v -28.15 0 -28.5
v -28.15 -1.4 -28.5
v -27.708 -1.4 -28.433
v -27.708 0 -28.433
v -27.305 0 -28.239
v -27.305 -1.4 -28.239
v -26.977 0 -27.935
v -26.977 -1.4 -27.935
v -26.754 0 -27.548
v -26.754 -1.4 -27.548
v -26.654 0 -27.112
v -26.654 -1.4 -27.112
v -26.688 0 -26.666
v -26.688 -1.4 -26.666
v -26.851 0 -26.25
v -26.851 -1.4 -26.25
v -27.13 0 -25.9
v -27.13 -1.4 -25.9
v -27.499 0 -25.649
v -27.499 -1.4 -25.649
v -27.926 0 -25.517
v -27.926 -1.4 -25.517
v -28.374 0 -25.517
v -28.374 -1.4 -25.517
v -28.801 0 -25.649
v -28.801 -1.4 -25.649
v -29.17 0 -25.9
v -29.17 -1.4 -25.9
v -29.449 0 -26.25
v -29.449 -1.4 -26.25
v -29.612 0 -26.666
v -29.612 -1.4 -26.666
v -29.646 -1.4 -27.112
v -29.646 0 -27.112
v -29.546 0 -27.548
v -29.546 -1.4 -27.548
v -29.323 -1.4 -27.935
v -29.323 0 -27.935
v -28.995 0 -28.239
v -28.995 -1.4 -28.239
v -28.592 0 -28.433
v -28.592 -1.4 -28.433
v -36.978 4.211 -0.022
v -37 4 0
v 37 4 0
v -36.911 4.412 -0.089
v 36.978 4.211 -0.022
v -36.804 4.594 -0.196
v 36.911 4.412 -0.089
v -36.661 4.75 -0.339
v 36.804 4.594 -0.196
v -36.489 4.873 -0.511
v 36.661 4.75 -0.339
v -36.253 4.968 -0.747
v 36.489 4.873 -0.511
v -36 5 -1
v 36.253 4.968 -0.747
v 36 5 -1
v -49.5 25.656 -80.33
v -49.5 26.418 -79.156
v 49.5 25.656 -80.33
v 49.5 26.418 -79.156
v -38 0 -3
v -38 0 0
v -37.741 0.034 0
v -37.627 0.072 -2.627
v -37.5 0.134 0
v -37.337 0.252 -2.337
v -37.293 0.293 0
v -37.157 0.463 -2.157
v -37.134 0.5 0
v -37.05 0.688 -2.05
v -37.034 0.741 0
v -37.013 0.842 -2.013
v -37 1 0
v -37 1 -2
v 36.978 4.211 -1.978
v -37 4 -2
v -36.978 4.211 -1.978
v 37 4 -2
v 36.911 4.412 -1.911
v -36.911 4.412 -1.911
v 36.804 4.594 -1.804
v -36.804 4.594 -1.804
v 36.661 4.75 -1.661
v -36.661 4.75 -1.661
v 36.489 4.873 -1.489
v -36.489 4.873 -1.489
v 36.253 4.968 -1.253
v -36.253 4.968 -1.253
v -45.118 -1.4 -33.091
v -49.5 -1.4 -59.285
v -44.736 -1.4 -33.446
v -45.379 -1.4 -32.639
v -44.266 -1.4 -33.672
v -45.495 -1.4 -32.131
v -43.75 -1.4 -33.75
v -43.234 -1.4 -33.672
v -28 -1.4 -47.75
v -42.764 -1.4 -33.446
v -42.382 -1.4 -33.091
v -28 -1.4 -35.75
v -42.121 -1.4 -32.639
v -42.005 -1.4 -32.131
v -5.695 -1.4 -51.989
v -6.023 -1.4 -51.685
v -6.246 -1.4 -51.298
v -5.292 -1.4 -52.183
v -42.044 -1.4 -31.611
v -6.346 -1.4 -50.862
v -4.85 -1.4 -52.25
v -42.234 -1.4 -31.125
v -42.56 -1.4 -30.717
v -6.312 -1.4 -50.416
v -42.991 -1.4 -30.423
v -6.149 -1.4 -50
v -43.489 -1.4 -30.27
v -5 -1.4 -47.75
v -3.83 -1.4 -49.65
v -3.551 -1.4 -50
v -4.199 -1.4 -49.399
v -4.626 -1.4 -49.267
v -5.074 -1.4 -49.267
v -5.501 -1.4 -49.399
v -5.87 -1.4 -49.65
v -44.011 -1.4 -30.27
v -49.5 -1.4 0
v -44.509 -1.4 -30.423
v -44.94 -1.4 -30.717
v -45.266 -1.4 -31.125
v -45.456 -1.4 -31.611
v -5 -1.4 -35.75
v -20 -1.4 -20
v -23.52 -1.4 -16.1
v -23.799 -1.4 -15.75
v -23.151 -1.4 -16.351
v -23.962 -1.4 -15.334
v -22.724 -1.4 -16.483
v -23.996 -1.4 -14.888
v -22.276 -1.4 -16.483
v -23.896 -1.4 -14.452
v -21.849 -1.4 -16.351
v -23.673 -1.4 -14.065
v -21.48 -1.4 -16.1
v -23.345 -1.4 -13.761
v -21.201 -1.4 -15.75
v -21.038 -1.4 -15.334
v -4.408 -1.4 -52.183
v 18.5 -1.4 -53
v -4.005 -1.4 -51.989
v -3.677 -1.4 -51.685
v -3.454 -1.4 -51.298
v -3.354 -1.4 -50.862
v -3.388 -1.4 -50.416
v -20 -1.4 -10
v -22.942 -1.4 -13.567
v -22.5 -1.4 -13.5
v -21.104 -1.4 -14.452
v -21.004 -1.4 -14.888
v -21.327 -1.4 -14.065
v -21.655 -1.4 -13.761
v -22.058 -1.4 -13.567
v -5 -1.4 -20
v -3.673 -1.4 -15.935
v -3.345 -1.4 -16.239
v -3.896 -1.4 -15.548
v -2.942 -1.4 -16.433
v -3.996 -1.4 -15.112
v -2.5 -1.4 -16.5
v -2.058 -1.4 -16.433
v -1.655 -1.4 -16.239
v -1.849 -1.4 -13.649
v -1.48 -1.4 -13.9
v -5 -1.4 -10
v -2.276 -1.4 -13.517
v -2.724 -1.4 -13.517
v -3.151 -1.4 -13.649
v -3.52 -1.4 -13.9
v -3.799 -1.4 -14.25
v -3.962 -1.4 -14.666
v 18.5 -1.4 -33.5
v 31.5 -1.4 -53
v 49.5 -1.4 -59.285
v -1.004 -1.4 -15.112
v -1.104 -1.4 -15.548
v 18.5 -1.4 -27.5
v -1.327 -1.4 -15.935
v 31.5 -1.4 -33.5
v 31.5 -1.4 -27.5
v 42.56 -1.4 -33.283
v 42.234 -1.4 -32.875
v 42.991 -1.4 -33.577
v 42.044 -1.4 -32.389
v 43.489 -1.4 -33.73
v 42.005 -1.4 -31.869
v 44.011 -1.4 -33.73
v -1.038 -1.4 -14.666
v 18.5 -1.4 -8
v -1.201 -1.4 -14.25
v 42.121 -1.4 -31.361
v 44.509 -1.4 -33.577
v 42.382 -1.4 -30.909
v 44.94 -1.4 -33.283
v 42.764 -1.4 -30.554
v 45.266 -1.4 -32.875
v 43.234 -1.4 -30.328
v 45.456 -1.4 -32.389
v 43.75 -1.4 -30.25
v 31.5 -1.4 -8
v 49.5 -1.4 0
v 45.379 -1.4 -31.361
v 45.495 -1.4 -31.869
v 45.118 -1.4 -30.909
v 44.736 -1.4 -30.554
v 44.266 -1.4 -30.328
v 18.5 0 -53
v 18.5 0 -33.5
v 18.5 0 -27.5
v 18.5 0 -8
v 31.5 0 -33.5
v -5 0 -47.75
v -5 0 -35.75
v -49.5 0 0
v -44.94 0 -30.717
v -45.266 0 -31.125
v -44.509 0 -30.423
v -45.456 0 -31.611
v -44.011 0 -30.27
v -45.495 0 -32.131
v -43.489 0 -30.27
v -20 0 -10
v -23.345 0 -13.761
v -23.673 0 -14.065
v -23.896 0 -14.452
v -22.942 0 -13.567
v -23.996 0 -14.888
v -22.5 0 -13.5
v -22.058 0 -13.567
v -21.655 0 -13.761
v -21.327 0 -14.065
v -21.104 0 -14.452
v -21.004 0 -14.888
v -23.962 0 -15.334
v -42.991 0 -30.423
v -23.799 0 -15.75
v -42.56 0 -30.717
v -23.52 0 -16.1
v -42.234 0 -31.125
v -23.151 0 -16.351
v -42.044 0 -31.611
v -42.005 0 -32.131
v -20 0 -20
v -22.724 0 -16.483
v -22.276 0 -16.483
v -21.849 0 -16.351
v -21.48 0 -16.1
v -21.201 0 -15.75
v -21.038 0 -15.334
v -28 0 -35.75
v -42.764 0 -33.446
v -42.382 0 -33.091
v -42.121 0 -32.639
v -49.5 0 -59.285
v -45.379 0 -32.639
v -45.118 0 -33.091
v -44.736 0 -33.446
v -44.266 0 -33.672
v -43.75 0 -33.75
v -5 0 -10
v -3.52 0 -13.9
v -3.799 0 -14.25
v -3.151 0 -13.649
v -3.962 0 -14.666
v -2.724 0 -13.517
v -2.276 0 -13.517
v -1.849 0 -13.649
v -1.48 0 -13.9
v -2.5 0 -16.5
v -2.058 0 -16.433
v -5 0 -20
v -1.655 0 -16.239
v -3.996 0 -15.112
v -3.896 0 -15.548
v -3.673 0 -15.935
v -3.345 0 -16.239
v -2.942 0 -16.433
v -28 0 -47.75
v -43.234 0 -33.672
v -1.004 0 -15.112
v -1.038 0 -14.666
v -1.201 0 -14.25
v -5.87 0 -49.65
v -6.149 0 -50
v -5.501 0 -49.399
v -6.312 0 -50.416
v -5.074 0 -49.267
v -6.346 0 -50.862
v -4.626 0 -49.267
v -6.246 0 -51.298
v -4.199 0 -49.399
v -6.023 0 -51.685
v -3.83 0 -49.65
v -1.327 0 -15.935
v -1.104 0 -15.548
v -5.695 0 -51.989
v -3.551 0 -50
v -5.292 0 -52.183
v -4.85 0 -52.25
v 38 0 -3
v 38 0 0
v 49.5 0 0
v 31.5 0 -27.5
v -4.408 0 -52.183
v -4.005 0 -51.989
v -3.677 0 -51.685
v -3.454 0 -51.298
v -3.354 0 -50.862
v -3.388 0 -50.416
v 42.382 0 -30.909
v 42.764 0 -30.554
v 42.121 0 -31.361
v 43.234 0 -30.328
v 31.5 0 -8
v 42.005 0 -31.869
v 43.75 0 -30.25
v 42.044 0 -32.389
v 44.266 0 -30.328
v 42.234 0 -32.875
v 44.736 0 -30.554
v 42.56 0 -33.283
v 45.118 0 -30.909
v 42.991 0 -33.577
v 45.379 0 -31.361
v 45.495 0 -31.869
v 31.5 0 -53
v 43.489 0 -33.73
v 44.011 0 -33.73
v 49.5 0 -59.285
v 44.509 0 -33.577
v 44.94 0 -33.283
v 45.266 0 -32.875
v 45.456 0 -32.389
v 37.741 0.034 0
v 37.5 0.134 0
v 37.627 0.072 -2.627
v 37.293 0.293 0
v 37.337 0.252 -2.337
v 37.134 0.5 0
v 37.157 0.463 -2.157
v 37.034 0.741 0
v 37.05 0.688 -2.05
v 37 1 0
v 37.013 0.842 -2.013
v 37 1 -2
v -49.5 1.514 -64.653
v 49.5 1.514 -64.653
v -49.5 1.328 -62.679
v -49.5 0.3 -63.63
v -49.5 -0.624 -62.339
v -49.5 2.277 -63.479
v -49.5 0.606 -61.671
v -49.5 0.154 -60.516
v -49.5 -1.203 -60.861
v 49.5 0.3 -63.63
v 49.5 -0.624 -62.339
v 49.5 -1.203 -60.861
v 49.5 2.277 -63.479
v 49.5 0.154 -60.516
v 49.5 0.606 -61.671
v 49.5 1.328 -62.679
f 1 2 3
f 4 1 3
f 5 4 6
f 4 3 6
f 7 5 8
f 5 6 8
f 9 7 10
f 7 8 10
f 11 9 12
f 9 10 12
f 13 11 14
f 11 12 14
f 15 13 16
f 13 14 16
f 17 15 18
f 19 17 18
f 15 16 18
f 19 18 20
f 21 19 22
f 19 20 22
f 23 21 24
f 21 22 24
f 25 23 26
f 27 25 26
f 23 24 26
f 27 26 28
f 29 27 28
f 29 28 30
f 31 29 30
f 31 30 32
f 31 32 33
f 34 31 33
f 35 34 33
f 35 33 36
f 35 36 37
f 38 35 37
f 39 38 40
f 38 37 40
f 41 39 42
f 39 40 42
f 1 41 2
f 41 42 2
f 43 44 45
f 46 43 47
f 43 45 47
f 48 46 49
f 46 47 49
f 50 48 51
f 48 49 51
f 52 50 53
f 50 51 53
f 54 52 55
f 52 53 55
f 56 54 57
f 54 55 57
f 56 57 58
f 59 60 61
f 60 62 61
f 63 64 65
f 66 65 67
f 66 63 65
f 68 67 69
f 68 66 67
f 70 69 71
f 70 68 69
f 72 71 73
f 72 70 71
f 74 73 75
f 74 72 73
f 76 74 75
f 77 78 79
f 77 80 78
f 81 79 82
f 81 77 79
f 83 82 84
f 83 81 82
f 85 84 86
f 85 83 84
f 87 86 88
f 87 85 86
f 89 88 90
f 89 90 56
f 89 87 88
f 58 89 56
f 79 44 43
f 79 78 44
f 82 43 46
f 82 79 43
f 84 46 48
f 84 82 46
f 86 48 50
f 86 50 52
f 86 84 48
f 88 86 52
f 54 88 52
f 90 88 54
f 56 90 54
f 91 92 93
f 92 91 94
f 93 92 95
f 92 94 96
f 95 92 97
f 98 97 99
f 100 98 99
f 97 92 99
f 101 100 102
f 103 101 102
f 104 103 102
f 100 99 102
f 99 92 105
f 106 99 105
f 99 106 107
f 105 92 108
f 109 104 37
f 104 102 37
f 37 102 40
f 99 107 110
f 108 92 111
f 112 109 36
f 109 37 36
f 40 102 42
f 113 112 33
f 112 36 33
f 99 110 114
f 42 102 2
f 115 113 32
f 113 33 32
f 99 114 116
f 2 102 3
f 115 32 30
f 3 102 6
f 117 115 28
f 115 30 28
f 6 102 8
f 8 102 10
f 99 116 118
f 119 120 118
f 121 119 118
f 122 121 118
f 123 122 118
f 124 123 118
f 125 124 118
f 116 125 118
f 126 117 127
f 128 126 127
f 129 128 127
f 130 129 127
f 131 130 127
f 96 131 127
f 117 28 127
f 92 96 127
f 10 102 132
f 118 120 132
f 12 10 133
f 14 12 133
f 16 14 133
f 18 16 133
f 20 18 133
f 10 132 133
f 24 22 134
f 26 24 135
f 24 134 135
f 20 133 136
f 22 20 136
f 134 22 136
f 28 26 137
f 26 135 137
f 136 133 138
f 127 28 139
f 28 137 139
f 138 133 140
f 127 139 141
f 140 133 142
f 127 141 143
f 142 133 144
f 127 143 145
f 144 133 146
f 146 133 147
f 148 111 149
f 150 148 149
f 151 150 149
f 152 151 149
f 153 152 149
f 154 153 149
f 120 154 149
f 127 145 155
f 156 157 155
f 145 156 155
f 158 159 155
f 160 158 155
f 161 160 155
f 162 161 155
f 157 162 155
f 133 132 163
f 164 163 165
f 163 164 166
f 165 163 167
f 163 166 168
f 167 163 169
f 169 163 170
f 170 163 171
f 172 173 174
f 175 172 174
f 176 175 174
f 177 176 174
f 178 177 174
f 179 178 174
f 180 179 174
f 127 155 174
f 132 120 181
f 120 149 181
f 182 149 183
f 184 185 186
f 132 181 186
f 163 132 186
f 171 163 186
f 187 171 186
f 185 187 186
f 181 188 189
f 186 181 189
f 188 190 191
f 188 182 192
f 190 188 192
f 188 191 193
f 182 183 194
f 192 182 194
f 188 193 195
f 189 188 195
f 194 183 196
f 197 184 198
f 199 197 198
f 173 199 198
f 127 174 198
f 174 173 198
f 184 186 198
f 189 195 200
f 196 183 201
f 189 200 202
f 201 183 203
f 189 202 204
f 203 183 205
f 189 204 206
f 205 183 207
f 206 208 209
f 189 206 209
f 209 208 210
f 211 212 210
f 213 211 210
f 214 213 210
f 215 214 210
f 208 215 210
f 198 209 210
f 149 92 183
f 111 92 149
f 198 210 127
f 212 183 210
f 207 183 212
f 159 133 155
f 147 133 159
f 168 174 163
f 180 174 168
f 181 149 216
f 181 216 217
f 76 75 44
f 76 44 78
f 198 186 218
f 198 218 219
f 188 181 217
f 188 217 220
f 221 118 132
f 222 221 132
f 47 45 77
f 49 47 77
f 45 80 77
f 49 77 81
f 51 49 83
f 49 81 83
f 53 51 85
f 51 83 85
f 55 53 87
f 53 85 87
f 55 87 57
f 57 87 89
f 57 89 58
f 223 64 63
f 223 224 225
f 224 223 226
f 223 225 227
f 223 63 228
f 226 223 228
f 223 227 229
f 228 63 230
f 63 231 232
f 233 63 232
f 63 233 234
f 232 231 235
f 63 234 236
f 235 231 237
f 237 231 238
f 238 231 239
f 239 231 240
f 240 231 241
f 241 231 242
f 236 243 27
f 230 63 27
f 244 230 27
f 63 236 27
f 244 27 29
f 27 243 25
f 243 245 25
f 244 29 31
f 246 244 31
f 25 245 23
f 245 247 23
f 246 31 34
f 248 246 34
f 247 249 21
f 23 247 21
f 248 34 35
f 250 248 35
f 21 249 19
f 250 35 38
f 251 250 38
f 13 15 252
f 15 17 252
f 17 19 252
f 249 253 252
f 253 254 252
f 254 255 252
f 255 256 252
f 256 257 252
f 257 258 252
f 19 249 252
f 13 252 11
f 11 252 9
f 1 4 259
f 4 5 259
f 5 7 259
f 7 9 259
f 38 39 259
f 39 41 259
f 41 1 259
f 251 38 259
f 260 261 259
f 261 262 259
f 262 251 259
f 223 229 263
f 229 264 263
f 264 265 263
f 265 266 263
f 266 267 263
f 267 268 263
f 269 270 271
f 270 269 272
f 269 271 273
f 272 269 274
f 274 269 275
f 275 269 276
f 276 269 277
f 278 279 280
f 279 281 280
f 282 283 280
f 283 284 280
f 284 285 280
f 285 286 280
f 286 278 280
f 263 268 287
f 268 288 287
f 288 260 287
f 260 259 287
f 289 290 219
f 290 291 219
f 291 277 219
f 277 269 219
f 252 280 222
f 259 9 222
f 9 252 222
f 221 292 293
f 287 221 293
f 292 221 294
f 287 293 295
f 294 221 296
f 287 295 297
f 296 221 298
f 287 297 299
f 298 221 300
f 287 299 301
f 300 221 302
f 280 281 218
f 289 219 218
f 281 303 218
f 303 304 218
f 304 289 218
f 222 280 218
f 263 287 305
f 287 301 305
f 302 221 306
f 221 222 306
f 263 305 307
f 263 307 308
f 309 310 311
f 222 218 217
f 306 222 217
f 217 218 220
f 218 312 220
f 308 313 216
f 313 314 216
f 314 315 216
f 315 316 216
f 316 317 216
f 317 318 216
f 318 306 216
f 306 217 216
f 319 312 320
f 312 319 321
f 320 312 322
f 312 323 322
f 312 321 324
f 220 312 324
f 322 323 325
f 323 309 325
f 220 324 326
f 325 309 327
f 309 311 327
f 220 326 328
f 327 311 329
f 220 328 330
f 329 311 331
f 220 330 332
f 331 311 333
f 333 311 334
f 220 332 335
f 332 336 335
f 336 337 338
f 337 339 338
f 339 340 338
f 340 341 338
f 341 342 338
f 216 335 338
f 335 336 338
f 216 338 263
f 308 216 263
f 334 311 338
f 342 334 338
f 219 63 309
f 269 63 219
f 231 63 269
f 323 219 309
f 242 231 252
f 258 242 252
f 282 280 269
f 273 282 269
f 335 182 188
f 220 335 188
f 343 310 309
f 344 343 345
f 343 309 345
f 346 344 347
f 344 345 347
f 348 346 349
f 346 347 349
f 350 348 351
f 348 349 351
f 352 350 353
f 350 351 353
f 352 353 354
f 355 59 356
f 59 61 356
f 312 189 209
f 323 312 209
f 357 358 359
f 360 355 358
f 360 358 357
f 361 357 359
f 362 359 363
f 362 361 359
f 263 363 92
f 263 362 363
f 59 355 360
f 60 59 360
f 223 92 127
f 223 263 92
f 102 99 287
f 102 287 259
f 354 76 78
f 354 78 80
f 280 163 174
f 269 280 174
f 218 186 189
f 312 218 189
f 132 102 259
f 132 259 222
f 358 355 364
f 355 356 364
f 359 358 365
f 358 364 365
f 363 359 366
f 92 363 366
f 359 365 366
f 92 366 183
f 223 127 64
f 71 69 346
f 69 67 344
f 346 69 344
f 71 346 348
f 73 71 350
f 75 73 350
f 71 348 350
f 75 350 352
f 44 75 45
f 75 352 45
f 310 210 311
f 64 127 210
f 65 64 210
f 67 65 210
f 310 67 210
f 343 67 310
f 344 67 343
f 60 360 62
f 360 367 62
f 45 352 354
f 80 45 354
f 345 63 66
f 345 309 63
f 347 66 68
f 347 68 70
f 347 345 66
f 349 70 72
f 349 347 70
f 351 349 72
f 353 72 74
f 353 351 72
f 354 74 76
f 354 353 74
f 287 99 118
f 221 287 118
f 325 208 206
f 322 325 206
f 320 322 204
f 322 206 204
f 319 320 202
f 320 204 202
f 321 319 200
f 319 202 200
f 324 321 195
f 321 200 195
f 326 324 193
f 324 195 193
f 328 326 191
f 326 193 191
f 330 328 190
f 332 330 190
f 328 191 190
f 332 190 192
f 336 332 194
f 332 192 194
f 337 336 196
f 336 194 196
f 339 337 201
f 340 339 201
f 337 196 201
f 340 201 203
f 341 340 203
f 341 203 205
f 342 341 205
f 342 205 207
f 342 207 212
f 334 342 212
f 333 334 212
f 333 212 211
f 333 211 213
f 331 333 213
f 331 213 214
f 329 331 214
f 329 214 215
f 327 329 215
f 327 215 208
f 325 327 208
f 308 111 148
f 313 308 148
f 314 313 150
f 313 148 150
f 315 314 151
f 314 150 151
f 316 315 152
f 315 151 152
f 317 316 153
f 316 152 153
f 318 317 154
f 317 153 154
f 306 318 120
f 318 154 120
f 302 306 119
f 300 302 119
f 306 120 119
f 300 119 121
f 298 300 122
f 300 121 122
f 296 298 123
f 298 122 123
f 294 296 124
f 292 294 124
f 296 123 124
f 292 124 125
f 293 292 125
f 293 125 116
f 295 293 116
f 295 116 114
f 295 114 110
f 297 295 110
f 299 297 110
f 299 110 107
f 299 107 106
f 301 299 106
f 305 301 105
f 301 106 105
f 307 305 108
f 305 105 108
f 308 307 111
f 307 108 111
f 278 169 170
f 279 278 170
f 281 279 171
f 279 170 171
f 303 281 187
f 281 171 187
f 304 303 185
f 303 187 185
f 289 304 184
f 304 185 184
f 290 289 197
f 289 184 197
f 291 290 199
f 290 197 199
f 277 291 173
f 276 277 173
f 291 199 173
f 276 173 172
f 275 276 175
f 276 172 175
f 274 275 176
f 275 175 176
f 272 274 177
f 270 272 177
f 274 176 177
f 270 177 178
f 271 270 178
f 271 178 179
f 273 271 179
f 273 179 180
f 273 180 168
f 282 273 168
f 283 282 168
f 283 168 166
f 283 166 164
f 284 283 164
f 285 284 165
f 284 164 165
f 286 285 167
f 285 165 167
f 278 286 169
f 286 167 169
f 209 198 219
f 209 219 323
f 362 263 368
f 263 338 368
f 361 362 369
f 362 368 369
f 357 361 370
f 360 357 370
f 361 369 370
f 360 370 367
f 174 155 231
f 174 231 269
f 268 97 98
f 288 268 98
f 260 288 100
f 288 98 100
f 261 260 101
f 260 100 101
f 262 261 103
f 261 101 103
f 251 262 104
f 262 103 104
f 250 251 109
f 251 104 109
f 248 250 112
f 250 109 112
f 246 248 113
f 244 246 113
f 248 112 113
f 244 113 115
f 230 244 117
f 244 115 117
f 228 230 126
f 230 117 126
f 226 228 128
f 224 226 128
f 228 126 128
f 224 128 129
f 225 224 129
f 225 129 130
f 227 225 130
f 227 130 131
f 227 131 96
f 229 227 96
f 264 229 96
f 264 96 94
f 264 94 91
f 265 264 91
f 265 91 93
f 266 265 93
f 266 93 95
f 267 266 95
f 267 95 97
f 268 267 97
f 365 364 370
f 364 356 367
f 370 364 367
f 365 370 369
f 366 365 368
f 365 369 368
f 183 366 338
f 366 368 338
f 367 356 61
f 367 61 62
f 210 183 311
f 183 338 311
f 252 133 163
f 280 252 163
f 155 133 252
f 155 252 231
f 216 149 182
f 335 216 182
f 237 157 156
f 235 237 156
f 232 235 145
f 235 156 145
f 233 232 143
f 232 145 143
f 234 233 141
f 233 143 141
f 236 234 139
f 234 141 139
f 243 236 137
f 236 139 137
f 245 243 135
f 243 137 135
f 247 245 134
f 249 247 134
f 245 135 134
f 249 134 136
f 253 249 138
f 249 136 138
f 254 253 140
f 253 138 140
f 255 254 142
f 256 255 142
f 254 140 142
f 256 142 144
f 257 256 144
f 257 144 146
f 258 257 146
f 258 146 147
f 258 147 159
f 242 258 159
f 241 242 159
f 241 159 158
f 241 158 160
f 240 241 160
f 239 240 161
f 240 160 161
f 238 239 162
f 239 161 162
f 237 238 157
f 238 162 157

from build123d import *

# Parameters (mm, degrees)
T_LE_DE_BASE_PLI_E1_DEPTH = 49.5
ESQUISSE6_R               = 1.75
ENL_V_MAT_EXTRU_1_DEPTH   = 99.371997957
ESQUISSE7_R               = 1.5
ESQUISSE7_W               = 13
ESQUISSE7_H               = 19.5
ESQUISSE7_W_2             = 23
ESQUISSE7_H_2             = 12
ESQUISSE7_W_3             = 15
ESQUISSE7_H_3             = 10
ENL_V_MAT_EXTRU_2_DEPTH   = 1.4
ESQUISSE11_W              = 74
ESQUISSE11_H              = 2
BOSS_EXTRU_2_DEPTH        = 5
CONG_1_R                  = 1


# Sheet-metal steps are written as plain solids
with BuildPart() as part:
    # Esquisse1 → Tôle de base pliée1 (new, symmetric)
    with BuildSketch(Plane(origin=(0, 0, 0), x_dir=(0, 0, -1), z_dir=(1, 0, 0))):
        with BuildLine():
            Line((0, 0), (59.285221502, 0))
            ThreePointArc((59.285221502, 0), (61.671015303, 0.605914437), (63.478574342, 2.276804825))
            Line((63.478574342, 2.276804825), (79.156129603, 26.41812289))
            Line((79.156129603, 26.41812289), (80.330268398, 25.655628241))
            Line((80.330268398, 25.655628241), (64.652713137, 1.514310176))
            ThreePointArc((64.652713137, 1.514310176), (62.339037567, -0.624429521), (59.285221502, -1.4))
            Line((59.285221502, -1.4), (0, -1.4))
            Line((0, -1.4), (0, 0))
        make_face()
    extrude(amount=T_LE_DE_BASE_PLI_E1_DEPTH, both=True)

    # Esquisse6 → Enlèv. mat.-Extru.1 (cut, through all)
    with BuildSketch(Plane.XZ.offset(1.4)):
        with Locations(Location((-43.75, -32, 0), (0, 0, 270))):
            Circle(ESQUISSE6_R)
        with Locations(Location((43.75, -32, 0), (0, 0, 90))):
            Circle(ESQUISSE6_R)
    extrude(amount=-ENL_V_MAT_EXTRU_1_DEPTH, mode=Mode.SUBTRACT)

    # Esquisse7 → Enlèv. mat.-Extru.2 (cut)
    with BuildSketch(Plane.XZ.offset(1.4)):
        with Locations(Location((-28.15, -27, 0), (0, 0, 270))):
            Circle(ESQUISSE7_R)
        with Locations(Location((-4.85, -50.75, 0), (0, 0, 270))):
            Circle(ESQUISSE7_R)
        with Locations(Location((-2.5, -15, 0), (0, 0, 270))):
            Circle(ESQUISSE7_R)
        with Locations(Location((-22.5, -15, 0), (0, 0, 90))):
            Circle(ESQUISSE7_R)
        with Locations((25, -17.75)):
            Rectangle(ESQUISSE7_W, ESQUISSE7_H)
        with Locations((-16.5, -41.75)):
            Rectangle(ESQUISSE7_W_2, ESQUISSE7_H_2)
        with Locations((25, -43.25)):
            Rectangle(ESQUISSE7_W, ESQUISSE7_H)
        with Locations((-12.5, -15)):
            Rectangle(ESQUISSE7_W_3, ESQUISSE7_H_3)
    extrude(amount=-ENL_V_MAT_EXTRU_2_DEPTH, mode=Mode.SUBTRACT)

    # Esquisse11 → Boss.-Extru.2 (add)
    with BuildSketch(Plane(origin=(0, 0, 0), x_dir=(1, 0, 0), z_dir=(0, 1, 0))):
        with Locations((0, 1)):
            Rectangle(ESQUISSE11_W, ESQUISSE11_H)
    extrude(amount=BOSS_EXTRU_2_DEPTH)

    # Congé1
    cong_1_edges = [part.edges().sort_by_distance(p)[0] for p in [
        (-37, 0, -1),
        (37, 0, -1),
        (0, 0, -2),
        (-37, 5, -1),
        (0, 5, 0),
        (37, 5, -1),
        (0, 5, -2),
    ]]
    fillet(cong_1_edges, radius=CONG_1_R - 0.0001)  # a hair under: the kernel refuses the full size


solid = part.part
